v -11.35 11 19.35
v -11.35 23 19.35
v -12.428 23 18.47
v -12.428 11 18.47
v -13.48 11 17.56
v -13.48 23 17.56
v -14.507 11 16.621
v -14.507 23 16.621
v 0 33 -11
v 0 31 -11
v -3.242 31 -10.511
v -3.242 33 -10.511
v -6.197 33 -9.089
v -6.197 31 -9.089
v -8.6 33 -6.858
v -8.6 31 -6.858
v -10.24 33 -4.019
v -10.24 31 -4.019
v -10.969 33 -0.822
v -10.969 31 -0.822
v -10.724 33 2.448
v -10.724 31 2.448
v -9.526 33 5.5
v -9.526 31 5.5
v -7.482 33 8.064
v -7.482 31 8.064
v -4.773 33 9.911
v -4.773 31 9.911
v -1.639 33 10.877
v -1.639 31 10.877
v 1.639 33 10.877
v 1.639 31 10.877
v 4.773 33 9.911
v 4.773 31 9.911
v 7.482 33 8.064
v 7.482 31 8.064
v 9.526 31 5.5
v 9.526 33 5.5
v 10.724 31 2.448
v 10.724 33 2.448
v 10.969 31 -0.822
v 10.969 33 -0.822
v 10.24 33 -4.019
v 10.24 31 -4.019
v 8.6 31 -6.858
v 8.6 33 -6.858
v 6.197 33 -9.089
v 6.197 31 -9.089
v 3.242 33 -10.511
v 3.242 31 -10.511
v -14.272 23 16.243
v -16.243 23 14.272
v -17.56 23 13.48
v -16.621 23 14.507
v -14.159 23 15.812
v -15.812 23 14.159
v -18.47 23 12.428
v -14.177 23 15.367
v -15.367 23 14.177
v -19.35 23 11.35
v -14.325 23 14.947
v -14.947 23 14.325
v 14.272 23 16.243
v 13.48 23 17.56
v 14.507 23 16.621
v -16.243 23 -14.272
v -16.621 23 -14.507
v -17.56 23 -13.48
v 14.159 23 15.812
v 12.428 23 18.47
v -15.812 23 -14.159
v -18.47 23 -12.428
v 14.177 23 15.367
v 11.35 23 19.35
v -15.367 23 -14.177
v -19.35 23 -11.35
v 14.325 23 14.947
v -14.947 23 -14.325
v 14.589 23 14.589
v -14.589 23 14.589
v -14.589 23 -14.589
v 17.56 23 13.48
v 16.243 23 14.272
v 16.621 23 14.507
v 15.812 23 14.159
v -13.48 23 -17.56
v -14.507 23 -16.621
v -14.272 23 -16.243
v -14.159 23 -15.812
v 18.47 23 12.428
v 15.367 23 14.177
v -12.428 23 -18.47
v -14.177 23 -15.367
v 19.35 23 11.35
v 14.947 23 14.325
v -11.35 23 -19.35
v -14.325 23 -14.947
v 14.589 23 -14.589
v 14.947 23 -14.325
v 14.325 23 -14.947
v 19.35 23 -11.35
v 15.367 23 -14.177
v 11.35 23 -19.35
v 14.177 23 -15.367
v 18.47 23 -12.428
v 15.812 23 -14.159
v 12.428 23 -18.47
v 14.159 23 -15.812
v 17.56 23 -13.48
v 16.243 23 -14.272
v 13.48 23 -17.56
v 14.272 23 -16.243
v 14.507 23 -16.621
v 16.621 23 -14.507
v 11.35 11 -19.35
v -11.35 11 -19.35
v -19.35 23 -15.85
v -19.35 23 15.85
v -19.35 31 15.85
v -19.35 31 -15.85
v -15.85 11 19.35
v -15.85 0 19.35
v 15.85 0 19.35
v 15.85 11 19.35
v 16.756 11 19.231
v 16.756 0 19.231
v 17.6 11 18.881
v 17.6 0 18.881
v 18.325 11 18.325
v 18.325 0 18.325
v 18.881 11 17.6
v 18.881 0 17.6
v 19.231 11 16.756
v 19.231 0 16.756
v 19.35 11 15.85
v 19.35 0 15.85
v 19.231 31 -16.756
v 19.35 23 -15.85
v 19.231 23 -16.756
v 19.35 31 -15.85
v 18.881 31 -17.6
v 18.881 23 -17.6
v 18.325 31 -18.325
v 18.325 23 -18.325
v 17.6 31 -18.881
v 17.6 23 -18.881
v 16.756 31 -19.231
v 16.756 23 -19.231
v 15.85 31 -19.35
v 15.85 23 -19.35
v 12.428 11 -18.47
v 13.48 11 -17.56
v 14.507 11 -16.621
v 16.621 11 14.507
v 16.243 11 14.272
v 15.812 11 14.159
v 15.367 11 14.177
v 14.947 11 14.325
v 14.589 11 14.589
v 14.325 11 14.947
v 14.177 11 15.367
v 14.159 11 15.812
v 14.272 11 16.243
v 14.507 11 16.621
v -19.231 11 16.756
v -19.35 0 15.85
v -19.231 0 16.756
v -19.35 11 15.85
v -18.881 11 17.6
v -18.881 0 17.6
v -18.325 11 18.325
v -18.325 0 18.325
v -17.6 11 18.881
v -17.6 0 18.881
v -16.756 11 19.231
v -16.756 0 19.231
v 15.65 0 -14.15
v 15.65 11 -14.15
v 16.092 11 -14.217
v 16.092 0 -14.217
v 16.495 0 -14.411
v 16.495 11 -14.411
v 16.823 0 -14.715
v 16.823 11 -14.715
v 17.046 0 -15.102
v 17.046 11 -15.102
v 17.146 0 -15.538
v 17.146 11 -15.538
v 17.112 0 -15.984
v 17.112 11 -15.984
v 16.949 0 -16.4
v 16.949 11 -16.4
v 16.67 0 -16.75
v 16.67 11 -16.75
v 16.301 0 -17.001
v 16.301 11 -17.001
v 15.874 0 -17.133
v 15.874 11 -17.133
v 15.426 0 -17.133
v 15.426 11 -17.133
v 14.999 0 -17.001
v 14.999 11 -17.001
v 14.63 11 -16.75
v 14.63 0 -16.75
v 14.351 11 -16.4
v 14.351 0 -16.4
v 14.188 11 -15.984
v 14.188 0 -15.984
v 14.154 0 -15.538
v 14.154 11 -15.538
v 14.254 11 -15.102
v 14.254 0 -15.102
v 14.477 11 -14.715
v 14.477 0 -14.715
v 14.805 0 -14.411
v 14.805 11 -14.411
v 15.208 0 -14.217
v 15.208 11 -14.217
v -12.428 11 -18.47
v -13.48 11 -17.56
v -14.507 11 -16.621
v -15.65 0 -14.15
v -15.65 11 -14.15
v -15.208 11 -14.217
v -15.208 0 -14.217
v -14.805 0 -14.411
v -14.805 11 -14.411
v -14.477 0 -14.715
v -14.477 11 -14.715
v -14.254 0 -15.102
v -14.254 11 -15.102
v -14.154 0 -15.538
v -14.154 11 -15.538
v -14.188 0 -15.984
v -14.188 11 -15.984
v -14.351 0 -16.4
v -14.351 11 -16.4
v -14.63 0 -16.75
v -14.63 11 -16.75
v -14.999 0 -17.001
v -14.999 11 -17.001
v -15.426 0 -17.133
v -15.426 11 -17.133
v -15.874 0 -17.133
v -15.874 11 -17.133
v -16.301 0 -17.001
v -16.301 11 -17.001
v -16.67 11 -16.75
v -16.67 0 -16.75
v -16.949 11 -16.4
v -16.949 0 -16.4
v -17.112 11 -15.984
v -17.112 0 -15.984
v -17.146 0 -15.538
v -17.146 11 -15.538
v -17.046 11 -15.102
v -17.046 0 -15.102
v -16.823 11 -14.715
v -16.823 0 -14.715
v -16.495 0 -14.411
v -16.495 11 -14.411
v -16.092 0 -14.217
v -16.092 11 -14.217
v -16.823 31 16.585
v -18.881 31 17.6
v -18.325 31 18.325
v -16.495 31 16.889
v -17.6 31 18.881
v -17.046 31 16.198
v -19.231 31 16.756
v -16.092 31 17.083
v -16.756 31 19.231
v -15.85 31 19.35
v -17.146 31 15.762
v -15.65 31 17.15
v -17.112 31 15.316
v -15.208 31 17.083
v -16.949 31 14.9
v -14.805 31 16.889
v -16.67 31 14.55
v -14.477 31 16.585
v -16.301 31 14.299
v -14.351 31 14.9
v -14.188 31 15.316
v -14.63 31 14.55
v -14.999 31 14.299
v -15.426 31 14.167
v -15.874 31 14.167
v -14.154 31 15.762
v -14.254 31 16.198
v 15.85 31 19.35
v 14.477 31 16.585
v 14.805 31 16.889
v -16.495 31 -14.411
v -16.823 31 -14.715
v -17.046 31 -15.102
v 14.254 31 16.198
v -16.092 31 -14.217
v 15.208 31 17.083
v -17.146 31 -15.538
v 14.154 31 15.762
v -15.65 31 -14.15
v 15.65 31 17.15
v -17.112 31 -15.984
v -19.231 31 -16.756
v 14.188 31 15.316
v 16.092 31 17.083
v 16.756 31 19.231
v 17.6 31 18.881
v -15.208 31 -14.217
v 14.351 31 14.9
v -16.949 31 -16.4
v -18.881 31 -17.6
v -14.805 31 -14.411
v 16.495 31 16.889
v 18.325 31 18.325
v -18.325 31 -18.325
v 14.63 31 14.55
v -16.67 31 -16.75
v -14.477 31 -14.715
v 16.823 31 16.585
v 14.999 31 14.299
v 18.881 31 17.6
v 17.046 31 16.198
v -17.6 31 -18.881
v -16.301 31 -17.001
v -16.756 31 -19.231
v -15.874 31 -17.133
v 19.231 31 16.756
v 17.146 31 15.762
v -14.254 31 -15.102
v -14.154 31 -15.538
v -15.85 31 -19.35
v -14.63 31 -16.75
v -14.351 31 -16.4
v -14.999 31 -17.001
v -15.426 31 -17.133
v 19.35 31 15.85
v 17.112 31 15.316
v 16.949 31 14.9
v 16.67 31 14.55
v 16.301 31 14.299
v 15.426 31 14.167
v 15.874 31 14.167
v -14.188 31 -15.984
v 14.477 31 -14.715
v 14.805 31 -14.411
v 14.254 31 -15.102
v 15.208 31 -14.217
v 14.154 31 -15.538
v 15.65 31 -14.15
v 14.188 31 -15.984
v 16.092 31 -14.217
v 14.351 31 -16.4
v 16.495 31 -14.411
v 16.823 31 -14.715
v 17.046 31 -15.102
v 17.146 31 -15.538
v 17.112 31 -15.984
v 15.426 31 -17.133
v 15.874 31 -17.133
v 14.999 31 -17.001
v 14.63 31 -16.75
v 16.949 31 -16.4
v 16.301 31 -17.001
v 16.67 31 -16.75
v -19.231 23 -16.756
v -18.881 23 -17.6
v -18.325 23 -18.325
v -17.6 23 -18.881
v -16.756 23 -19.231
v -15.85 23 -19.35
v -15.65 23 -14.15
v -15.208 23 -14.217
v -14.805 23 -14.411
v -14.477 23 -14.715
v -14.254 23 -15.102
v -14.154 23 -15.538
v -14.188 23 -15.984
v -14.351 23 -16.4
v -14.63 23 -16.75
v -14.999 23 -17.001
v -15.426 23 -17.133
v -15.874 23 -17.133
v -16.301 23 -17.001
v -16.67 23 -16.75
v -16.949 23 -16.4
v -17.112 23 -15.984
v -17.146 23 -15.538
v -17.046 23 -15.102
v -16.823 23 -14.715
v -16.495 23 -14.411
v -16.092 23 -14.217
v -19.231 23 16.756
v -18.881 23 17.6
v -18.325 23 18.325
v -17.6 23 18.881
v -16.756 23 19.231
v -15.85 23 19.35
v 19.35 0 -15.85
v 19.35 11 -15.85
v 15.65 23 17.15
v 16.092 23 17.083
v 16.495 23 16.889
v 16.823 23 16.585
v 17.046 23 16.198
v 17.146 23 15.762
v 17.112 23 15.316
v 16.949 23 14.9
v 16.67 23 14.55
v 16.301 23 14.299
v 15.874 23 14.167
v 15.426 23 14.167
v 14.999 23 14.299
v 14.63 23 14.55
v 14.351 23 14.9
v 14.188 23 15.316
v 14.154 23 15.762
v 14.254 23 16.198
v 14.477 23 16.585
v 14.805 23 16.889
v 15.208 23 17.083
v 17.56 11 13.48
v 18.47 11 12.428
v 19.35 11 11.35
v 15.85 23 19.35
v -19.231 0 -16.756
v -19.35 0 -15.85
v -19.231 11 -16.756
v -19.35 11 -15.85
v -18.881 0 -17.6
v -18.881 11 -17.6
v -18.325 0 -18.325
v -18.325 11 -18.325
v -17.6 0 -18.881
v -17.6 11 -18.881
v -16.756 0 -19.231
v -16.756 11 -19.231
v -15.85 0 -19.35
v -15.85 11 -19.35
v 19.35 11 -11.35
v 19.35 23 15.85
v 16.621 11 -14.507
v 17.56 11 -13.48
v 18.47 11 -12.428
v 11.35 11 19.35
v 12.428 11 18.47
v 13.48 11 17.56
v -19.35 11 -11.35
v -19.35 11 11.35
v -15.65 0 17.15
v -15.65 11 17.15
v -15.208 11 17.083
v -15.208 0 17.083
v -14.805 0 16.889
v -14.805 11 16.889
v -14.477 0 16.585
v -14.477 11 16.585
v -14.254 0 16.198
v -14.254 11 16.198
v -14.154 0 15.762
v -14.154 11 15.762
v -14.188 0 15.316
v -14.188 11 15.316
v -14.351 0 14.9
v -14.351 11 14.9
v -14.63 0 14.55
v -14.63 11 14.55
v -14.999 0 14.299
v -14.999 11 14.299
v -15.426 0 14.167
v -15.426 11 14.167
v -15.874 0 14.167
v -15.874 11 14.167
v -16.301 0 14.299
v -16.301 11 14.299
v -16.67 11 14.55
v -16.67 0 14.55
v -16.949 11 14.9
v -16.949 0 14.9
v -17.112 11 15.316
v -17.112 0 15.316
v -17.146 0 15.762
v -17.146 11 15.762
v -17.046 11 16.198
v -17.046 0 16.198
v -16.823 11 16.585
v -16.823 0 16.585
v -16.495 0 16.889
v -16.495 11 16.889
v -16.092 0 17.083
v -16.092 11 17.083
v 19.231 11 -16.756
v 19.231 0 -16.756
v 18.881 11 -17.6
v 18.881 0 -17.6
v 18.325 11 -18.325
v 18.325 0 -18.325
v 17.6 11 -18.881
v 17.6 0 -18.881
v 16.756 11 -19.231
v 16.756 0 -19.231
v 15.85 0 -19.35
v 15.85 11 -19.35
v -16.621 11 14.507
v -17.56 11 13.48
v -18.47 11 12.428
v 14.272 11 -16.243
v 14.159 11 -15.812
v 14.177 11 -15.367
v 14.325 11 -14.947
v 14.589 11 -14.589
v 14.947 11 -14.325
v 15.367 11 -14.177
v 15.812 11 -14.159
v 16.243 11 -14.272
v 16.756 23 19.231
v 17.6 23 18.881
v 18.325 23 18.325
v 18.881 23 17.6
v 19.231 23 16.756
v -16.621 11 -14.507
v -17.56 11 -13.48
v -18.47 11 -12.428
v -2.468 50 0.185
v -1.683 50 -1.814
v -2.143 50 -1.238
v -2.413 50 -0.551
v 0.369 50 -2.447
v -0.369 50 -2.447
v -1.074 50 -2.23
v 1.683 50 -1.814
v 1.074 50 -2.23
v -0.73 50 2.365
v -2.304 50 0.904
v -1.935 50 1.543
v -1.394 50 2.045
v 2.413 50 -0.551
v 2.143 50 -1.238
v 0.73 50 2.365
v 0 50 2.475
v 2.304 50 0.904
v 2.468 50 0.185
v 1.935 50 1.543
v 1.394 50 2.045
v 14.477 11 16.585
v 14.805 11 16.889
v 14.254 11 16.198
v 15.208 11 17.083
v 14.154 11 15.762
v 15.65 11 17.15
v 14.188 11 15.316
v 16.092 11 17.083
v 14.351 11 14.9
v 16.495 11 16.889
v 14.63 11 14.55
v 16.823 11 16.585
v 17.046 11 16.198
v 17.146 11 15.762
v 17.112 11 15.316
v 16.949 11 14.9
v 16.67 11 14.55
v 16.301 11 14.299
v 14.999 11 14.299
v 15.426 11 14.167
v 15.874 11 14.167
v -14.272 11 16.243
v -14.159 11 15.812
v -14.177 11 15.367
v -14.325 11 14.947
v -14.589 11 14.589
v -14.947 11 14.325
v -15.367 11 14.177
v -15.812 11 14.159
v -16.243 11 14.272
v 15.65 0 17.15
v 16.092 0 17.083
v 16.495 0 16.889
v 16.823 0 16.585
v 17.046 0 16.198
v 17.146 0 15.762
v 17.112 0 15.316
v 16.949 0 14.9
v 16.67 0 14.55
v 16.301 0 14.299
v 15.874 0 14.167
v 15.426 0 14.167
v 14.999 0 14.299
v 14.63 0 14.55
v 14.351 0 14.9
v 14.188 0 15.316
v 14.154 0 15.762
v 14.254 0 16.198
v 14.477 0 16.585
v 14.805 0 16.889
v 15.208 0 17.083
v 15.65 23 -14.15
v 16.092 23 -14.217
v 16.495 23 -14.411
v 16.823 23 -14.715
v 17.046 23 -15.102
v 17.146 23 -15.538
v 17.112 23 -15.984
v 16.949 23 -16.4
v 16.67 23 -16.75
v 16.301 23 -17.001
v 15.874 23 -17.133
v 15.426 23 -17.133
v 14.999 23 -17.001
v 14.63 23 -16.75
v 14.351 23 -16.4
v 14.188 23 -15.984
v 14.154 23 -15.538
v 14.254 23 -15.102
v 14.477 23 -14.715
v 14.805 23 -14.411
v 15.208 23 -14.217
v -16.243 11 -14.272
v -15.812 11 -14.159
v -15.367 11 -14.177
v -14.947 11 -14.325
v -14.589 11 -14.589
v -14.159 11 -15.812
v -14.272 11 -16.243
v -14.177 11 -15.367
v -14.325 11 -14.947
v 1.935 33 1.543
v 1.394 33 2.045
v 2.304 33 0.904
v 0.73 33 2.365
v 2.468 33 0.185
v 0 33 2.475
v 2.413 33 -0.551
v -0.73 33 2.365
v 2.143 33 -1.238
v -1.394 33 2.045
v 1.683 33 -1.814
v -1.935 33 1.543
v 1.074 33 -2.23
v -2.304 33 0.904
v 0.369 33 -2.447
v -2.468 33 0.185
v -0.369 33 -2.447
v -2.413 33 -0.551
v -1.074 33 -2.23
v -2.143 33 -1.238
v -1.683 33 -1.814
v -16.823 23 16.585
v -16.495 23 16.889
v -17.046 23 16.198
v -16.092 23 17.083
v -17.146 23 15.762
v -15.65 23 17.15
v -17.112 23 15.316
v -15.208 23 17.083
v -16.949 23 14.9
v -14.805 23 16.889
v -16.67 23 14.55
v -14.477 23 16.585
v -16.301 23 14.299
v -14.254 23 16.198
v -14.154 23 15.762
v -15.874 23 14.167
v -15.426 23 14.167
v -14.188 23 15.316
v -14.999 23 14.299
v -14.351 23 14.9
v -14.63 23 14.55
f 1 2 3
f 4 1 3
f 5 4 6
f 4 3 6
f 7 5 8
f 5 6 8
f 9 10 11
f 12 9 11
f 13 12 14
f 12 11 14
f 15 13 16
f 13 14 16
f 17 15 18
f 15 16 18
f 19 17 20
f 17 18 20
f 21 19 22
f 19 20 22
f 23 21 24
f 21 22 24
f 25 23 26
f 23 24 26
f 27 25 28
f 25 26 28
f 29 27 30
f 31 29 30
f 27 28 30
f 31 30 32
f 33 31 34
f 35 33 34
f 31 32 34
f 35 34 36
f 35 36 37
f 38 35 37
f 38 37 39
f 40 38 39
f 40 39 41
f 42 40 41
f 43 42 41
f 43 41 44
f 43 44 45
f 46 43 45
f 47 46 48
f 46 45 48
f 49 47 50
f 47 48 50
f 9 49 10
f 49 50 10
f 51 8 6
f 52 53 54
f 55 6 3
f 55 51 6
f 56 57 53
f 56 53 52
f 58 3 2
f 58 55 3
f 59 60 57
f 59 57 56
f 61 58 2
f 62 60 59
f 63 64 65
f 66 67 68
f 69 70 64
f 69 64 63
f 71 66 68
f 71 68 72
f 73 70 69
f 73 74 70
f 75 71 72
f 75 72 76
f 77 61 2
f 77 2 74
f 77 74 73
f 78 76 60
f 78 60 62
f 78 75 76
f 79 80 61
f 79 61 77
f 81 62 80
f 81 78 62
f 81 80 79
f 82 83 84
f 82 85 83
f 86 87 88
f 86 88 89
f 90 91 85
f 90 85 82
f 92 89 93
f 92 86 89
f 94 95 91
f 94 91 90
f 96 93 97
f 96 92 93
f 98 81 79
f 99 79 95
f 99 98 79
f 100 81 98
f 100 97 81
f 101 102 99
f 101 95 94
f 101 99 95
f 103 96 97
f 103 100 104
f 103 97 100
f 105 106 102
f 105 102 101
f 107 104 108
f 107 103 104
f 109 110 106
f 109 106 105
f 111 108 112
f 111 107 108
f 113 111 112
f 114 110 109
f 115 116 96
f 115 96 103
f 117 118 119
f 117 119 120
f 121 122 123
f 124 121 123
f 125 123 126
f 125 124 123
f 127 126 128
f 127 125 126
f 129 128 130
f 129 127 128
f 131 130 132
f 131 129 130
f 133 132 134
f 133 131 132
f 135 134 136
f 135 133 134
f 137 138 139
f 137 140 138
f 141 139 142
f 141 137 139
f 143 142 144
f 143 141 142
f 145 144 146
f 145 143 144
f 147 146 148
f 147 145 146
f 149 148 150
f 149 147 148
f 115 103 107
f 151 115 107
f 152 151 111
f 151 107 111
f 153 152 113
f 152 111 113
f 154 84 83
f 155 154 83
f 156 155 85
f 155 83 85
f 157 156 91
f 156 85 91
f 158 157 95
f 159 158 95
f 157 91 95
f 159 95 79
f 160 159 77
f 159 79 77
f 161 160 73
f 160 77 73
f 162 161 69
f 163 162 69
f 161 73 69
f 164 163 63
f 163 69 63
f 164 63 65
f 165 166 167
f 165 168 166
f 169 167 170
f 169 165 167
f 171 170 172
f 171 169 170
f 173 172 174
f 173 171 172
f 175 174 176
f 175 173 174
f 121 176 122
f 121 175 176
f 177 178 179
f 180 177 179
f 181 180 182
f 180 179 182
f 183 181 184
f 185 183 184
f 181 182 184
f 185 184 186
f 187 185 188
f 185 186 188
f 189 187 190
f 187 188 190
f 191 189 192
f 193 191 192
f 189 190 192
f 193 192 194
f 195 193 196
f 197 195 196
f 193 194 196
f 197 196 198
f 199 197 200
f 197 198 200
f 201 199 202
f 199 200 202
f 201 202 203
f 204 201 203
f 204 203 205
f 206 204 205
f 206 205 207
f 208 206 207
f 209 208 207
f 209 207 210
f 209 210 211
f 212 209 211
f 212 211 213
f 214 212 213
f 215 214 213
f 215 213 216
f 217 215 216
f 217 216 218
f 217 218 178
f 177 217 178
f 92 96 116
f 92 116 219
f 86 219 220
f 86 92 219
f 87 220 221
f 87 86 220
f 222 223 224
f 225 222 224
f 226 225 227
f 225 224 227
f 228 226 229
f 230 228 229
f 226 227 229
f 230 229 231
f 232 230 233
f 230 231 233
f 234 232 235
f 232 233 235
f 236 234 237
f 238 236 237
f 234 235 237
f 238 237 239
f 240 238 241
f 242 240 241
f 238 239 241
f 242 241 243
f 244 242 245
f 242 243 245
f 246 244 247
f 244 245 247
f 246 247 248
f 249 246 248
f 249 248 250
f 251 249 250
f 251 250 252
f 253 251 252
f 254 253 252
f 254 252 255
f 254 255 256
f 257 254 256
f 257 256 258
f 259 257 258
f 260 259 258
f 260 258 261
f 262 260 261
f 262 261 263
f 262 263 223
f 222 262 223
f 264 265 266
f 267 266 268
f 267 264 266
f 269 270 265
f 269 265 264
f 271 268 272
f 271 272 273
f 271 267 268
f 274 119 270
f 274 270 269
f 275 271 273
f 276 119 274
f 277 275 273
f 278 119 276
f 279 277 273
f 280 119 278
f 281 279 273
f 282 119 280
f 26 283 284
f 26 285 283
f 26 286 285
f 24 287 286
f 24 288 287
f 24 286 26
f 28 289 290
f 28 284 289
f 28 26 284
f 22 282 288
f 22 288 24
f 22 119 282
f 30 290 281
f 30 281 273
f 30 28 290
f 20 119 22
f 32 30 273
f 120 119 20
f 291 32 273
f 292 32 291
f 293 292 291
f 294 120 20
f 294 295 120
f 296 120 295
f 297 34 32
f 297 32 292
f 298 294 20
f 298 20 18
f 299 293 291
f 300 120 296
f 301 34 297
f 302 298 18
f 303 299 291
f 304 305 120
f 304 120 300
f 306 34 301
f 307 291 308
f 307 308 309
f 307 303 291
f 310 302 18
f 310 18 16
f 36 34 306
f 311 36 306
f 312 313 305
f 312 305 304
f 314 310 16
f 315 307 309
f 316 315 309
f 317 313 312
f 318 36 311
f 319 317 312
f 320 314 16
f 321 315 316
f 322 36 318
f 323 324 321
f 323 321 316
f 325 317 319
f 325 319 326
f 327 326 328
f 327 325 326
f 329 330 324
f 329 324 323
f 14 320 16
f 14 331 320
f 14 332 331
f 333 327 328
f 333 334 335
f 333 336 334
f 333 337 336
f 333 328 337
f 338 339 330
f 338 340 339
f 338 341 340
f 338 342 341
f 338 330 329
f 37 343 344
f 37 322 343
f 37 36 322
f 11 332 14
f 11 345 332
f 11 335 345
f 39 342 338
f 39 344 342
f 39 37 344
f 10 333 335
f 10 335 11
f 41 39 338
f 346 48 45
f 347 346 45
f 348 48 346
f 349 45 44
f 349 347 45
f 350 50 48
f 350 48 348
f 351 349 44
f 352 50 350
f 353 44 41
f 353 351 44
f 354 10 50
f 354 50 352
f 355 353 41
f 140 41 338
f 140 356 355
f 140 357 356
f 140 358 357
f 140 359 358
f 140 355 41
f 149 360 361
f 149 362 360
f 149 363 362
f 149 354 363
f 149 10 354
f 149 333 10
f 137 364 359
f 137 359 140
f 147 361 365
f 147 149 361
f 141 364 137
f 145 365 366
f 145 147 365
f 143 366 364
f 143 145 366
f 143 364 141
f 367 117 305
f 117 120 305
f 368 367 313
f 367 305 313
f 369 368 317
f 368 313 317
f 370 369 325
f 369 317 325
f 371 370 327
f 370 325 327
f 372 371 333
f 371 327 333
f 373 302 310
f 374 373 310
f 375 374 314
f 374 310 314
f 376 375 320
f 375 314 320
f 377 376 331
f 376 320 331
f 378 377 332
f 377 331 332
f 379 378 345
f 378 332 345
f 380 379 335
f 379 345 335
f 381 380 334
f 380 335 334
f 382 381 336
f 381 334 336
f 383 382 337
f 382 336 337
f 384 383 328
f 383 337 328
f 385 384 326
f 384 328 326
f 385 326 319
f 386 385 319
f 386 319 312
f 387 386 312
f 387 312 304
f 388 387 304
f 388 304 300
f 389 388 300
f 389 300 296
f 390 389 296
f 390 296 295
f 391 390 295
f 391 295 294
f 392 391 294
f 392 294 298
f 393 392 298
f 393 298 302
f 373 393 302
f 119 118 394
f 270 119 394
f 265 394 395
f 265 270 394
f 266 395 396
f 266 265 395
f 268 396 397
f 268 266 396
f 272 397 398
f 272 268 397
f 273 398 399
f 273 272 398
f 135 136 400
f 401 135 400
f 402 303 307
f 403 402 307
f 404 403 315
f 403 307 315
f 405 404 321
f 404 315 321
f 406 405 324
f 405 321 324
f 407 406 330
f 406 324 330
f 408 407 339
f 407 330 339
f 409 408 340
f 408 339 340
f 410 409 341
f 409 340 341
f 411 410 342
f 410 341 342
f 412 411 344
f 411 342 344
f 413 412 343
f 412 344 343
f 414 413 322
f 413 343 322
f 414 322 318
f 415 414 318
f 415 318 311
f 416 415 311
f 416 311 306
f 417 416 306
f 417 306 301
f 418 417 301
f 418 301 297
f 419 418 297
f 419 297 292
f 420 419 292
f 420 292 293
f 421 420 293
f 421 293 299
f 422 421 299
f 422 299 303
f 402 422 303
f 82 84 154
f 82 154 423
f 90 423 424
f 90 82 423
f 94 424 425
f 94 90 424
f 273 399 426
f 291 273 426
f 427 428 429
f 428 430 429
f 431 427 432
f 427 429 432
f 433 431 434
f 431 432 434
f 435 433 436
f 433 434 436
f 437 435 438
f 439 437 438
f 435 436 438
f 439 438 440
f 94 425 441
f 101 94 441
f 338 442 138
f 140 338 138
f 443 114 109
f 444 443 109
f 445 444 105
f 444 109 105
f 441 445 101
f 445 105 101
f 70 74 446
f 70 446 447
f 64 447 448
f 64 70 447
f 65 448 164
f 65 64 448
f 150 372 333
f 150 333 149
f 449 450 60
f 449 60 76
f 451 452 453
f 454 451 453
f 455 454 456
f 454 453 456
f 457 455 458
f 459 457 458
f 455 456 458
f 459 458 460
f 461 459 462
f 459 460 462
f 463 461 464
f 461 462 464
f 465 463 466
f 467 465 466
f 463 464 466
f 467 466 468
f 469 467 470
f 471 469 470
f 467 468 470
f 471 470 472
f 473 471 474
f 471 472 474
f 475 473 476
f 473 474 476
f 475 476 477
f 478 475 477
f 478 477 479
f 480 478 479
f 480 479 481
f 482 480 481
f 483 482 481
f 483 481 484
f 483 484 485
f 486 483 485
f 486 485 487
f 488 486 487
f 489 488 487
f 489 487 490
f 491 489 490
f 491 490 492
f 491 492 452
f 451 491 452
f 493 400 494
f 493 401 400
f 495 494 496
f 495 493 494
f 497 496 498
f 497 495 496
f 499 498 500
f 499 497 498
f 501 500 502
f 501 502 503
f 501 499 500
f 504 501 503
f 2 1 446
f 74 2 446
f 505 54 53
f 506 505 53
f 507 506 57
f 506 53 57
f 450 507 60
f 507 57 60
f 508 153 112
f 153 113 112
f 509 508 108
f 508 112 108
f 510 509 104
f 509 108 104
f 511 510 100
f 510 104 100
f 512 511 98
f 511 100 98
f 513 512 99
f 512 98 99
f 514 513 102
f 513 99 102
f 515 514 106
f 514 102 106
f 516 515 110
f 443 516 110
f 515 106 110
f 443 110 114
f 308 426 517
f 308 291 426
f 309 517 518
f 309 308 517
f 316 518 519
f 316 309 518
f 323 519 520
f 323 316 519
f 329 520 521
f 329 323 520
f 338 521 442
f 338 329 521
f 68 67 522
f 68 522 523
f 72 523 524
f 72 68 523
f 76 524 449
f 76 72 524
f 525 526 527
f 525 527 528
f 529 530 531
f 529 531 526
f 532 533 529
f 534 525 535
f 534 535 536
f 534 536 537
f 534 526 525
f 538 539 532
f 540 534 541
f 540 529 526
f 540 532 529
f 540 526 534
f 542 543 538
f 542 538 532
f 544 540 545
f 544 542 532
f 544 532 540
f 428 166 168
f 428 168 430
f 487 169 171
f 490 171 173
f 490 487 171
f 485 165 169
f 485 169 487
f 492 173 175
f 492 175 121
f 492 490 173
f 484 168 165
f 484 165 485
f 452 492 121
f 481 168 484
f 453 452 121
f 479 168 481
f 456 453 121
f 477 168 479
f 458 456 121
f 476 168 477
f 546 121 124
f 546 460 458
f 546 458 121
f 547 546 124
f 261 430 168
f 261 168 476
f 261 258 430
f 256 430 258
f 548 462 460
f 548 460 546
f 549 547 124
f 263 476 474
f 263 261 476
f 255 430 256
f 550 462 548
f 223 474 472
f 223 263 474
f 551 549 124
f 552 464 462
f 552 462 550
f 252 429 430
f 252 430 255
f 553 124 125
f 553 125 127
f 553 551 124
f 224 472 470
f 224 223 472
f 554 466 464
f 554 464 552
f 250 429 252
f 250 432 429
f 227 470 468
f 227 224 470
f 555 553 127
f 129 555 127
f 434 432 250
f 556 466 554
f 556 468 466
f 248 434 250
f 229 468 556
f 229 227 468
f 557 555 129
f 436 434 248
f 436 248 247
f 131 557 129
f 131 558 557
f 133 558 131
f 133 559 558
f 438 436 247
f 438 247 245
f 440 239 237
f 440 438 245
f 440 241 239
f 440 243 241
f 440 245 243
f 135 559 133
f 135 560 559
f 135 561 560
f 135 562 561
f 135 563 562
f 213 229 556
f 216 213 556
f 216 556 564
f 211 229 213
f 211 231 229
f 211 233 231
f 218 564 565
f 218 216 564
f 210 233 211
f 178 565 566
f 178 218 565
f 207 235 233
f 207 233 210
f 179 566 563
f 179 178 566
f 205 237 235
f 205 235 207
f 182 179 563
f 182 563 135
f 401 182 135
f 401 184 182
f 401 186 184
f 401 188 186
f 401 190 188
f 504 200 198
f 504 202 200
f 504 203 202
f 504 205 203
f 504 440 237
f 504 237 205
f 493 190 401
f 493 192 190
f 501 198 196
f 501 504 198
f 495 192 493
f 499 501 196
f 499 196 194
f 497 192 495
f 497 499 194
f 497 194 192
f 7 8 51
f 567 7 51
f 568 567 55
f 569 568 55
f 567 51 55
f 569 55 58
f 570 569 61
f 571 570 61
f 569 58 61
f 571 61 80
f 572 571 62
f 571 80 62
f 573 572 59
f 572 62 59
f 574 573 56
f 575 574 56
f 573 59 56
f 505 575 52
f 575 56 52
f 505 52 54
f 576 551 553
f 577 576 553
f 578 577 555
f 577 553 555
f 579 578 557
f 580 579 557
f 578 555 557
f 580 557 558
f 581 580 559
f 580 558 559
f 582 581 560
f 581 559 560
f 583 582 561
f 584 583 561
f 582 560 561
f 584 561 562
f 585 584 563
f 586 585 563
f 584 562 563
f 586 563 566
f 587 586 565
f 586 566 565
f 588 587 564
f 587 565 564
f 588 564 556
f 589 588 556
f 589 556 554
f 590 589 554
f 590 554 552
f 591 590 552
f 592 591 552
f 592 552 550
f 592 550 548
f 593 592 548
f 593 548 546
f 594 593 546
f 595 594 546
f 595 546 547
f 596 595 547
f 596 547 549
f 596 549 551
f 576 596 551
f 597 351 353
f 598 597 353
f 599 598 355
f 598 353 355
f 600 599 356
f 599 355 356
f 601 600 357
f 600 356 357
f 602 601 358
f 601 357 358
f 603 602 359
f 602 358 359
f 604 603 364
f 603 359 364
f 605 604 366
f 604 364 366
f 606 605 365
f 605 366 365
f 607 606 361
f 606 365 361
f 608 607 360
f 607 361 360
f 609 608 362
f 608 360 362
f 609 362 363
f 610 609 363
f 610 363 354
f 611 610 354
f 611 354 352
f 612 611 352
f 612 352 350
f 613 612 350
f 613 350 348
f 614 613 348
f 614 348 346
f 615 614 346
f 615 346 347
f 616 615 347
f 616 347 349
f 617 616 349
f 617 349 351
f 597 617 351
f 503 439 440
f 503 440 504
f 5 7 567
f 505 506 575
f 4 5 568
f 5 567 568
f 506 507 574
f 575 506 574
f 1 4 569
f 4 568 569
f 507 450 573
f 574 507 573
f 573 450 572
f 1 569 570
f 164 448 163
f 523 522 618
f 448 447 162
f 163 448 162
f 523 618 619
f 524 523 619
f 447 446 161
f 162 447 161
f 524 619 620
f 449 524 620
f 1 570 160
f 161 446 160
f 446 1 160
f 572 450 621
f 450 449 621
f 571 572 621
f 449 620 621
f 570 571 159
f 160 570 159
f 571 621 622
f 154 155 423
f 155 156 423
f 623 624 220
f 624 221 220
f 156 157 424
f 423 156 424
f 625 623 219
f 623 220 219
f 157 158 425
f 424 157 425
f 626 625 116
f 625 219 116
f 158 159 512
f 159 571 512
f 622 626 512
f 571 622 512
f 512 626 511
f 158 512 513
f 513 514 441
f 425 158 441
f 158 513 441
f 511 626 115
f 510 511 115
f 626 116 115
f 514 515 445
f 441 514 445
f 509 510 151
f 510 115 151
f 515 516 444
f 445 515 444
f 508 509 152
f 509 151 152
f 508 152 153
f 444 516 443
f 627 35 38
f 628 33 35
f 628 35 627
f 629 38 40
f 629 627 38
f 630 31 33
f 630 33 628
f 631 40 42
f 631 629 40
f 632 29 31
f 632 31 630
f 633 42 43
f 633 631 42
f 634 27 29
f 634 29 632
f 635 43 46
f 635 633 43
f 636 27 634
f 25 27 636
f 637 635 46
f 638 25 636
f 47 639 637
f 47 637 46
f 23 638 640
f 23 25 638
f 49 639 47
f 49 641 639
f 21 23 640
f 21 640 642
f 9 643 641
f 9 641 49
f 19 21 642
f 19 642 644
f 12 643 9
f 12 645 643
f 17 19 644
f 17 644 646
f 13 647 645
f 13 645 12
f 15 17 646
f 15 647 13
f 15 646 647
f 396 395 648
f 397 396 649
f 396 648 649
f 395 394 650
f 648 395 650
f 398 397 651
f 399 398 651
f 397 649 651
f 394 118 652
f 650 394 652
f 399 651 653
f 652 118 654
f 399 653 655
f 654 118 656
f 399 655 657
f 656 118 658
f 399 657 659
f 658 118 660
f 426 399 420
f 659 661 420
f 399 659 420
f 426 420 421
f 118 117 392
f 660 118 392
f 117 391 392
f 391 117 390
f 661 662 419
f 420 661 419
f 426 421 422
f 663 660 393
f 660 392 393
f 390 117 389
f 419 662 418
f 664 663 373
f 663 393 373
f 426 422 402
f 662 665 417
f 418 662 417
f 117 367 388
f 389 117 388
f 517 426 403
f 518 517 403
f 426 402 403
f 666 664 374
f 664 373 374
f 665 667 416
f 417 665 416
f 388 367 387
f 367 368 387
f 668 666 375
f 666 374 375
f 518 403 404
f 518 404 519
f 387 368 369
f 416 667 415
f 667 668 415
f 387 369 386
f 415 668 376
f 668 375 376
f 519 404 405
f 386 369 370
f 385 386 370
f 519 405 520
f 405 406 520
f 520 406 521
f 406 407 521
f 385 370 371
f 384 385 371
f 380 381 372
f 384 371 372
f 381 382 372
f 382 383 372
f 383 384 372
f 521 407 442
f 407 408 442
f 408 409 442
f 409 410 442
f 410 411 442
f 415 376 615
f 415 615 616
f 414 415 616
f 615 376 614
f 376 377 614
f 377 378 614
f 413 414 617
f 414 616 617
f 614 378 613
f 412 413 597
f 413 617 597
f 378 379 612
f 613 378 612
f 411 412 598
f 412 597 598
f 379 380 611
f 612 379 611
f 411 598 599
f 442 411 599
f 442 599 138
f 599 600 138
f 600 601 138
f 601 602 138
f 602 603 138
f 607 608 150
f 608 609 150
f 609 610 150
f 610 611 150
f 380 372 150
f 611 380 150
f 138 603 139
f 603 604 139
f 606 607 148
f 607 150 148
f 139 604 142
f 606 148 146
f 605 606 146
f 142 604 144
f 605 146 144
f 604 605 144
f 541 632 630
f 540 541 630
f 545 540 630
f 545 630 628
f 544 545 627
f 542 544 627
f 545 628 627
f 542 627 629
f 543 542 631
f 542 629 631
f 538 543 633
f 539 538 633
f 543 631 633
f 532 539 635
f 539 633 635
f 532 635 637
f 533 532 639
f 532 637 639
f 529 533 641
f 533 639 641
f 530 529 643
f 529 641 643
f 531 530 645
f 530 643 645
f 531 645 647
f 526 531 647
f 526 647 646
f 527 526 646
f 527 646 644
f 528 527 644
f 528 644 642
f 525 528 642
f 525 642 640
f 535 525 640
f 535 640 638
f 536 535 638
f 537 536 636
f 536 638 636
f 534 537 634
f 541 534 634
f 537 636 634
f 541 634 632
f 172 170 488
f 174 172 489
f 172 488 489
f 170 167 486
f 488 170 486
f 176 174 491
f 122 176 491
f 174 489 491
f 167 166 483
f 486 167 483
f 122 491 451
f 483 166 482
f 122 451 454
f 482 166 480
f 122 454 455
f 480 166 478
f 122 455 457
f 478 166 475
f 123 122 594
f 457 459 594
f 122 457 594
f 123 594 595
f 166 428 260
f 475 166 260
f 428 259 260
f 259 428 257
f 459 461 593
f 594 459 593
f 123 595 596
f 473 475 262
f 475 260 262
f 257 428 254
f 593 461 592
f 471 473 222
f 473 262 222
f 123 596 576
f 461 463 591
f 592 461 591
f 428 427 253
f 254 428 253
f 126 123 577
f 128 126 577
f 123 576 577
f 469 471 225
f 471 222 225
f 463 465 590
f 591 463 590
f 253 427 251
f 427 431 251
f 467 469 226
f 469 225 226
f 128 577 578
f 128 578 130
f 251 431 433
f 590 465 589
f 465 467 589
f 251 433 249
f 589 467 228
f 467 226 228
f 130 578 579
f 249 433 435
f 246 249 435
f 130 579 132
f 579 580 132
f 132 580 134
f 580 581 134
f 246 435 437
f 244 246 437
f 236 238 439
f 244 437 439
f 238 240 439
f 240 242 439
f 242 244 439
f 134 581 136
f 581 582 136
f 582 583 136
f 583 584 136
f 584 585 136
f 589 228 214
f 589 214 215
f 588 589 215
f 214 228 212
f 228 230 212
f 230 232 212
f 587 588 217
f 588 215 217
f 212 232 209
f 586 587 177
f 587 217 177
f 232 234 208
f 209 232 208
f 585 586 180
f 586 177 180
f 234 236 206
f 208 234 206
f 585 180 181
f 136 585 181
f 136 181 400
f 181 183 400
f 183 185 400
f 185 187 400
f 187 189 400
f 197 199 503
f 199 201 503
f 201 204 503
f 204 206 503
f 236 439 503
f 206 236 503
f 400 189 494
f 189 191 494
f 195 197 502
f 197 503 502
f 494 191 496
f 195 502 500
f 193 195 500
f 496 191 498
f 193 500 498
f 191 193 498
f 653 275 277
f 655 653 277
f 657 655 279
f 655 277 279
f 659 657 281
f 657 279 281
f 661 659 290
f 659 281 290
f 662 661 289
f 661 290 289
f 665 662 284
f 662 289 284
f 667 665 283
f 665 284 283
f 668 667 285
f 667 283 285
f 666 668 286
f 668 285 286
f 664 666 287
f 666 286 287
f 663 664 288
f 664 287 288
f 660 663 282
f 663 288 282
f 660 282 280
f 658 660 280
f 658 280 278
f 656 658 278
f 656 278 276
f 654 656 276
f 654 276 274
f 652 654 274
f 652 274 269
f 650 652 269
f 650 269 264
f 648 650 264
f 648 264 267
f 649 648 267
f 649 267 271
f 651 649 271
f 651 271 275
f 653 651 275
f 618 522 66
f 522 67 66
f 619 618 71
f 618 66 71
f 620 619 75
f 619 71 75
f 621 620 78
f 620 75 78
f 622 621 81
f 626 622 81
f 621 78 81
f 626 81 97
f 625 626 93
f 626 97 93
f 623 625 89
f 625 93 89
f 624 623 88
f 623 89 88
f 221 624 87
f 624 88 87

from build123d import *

# Parameters (mm, degrees)
SKETCH_1_W          = 38.7
SKETCH_1_H          = 38.7
EXTRUDE_1_DEPTH     = 11
SKETCH_2_W          = 38.7
SKETCH_2_H          = 38.7
EXTRUDE_2_DEPTH     = 12
SKETCH_3_W          = 38.7
SKETCH_3_H          = 38.7
EXTRUDE_3_DEPTH     = 8
CUT_EXTRUDE_1_DEPTH = 12
FILLET_1_R          = 3.5
FILLET_2_R          = 3.5
SKETCH_5_R          = 1.5
CUT_EXTRUDE_2_DEPTH = 42.350272067
SKETCH_6_R          = 11
EXTRUDE_4_DEPTH     = 2
SKETCH_7_R          = 2.475
EXTRUDE_5_DEPTH     = 17


with BuildPart() as part:
    # 스케치1 → 보스-돌출1 (new body)
    with BuildSketch(Plane(origin=(0, 0, 0), x_dir=(1, 0, 0), z_dir=(0, 1, 0))):
        Rectangle(SKETCH_1_W, SKETCH_1_H)
    extrude(amount=EXTRUDE_1_DEPTH)

    # 필렛2
    fillet_2_edges = [part.edges().sort_by_distance(p)[0] for p in [
        (19.35, 5.5, 19.35),
        (-19.35, 5.5, 19.35),
        (-19.35, 5.5, -19.35),
        (19.35, 5.5, -19.35),
    ]]
    fillet(fillet_2_edges, radius=FILLET_2_R)


with BuildPart() as body_2:
    # 스케치2 → 보스-돌출2 (new body)
    with BuildSketch(Plane(origin=(0, 11, 0), x_dir=(1, 0, 0), z_dir=(0, 1, 0))):
        Rectangle(SKETCH_2_W, SKETCH_2_H)
    extrude(amount=EXTRUDE_2_DEPTH)

    # 스케치4 → 컷-돌출1 (cut)
    with BuildSketch(Plane(origin=(0, 23, 0), x_dir=(1, 0, 0), z_dir=(0, 1, 0))):
        with BuildLine():
            Line((19.35, 11.35), (19.35, 19.35))
            Line((19.35, 19.35), (11.35, 19.35))
            ThreePointArc((11.35, 19.35), (15.579786716, 15.579786716), (19.35, 11.35))
        make_face()
        with BuildLine():
            Line((19.35, -11.35), (19.35, -19.35))
            Line((19.35, -19.35), (11.35, -19.35))
            ThreePointArc((11.35, -19.35), (15.579786716, -15.579786716), (19.35, -11.35))
        make_face()
        with BuildLine():
            Line((-19.35, -11.35), (-19.35, -19.35))
            Line((-19.35, -19.35), (-11.35, -19.35))
            ThreePointArc((-11.35, -19.35), (-15.579786716, -15.579786716), (-19.35, -11.35))
        make_face()
        with BuildLine():
            Line((-19.35, 11.35), (-19.35, 19.35))
            Line((-19.35, 19.35), (-11.35, 19.35))
            ThreePointArc((-11.35, 19.35), (-15.579786716, 15.579786716), (-19.35, 11.35))
        make_face()
    extrude(amount=-CUT_EXTRUDE_1_DEPTH, mode=Mode.SUBTRACT)


with BuildPart() as body_3:
    # 스케치3 → 보스-돌출3 (new body)
    with BuildSketch(Plane(origin=(0, 23, 0), x_dir=(1, 0, 0), z_dir=(0, 1, 0))):
        Rectangle(SKETCH_3_W, SKETCH_3_H)
    extrude(amount=EXTRUDE_3_DEPTH)

    # 필렛1
    fillet_1_edges = [body_3.edges().sort_by_distance(p)[0] for p in [
        (19.35, 27, 19.35),
        (-19.35, 27, 19.35),
        (-19.35, 27, -19.35),
        (19.35, 27, -19.35),
    ]]
    fillet(fillet_1_edges, radius=FILLET_1_R)


with BuildPart() as cut_extrude_2_tool:
    # 스케치5 → 컷-돌출2 (new, through all)
    with BuildSketch(Plane(origin=(0, 31, 0), x_dir=(1, 0, 0), z_dir=(0, 1, 0))):
        with Locations(Location((15.65, 15.65, 0), (0, 0, 270))):
            Circle(SKETCH_5_R)
        with Locations(Location((-15.65, 15.65, 0), (0, 0, 270))):
            Circle(SKETCH_5_R)
        with Locations(Location((-15.65, -15.65, 0), (0, 0, 270))):
            Circle(SKETCH_5_R)
        with Locations(Location((15.65, -15.65, 0), (0, 0, 270))):
            Circle(SKETCH_5_R)
    extrude(amount=-CUT_EXTRUDE_2_DEPTH)


with BuildPart() as part_1:
    add(part.part)

    # 컷-돌출2: cut by cut_extrude_2_tool
    add(cut_extrude_2_tool.part, mode=Mode.SUBTRACT)


with BuildPart() as body_2_1:
    add(body_2.part)

    # 컷-돌출2: cut by cut_extrude_2_tool
    add(cut_extrude_2_tool.part, mode=Mode.SUBTRACT)


with BuildPart() as body_3_1:
    add(body_3.part)

    # 컷-돌출2: cut by cut_extrude_2_tool
    add(cut_extrude_2_tool.part, mode=Mode.SUBTRACT)

    # 스케치6 → 보스-돌출4 (add)
    with BuildSketch(Plane(origin=(0, 31, 0), x_dir=(1, 0, 0), z_dir=(0, 1, 0))):
        with Locations(Location((0, 0, 0), (0, 0, 90))):
            Circle(SKETCH_6_R)
    extrude(amount=EXTRUDE_4_DEPTH)

    # 스케치7 → 보스-돌출5 (add)
    with BuildSketch(Plane(origin=(0, 33, 0), x_dir=(1, 0, 0), z_dir=(0, 1, 0))):
        with Locations(Location((0, 0, 0), (0, 0, 270))):
            Circle(SKETCH_7_R)
    extrude(amount=EXTRUDE_5_DEPTH)


solid = Compound([part_1.part, body_2_1.part, body_3_1.part])
